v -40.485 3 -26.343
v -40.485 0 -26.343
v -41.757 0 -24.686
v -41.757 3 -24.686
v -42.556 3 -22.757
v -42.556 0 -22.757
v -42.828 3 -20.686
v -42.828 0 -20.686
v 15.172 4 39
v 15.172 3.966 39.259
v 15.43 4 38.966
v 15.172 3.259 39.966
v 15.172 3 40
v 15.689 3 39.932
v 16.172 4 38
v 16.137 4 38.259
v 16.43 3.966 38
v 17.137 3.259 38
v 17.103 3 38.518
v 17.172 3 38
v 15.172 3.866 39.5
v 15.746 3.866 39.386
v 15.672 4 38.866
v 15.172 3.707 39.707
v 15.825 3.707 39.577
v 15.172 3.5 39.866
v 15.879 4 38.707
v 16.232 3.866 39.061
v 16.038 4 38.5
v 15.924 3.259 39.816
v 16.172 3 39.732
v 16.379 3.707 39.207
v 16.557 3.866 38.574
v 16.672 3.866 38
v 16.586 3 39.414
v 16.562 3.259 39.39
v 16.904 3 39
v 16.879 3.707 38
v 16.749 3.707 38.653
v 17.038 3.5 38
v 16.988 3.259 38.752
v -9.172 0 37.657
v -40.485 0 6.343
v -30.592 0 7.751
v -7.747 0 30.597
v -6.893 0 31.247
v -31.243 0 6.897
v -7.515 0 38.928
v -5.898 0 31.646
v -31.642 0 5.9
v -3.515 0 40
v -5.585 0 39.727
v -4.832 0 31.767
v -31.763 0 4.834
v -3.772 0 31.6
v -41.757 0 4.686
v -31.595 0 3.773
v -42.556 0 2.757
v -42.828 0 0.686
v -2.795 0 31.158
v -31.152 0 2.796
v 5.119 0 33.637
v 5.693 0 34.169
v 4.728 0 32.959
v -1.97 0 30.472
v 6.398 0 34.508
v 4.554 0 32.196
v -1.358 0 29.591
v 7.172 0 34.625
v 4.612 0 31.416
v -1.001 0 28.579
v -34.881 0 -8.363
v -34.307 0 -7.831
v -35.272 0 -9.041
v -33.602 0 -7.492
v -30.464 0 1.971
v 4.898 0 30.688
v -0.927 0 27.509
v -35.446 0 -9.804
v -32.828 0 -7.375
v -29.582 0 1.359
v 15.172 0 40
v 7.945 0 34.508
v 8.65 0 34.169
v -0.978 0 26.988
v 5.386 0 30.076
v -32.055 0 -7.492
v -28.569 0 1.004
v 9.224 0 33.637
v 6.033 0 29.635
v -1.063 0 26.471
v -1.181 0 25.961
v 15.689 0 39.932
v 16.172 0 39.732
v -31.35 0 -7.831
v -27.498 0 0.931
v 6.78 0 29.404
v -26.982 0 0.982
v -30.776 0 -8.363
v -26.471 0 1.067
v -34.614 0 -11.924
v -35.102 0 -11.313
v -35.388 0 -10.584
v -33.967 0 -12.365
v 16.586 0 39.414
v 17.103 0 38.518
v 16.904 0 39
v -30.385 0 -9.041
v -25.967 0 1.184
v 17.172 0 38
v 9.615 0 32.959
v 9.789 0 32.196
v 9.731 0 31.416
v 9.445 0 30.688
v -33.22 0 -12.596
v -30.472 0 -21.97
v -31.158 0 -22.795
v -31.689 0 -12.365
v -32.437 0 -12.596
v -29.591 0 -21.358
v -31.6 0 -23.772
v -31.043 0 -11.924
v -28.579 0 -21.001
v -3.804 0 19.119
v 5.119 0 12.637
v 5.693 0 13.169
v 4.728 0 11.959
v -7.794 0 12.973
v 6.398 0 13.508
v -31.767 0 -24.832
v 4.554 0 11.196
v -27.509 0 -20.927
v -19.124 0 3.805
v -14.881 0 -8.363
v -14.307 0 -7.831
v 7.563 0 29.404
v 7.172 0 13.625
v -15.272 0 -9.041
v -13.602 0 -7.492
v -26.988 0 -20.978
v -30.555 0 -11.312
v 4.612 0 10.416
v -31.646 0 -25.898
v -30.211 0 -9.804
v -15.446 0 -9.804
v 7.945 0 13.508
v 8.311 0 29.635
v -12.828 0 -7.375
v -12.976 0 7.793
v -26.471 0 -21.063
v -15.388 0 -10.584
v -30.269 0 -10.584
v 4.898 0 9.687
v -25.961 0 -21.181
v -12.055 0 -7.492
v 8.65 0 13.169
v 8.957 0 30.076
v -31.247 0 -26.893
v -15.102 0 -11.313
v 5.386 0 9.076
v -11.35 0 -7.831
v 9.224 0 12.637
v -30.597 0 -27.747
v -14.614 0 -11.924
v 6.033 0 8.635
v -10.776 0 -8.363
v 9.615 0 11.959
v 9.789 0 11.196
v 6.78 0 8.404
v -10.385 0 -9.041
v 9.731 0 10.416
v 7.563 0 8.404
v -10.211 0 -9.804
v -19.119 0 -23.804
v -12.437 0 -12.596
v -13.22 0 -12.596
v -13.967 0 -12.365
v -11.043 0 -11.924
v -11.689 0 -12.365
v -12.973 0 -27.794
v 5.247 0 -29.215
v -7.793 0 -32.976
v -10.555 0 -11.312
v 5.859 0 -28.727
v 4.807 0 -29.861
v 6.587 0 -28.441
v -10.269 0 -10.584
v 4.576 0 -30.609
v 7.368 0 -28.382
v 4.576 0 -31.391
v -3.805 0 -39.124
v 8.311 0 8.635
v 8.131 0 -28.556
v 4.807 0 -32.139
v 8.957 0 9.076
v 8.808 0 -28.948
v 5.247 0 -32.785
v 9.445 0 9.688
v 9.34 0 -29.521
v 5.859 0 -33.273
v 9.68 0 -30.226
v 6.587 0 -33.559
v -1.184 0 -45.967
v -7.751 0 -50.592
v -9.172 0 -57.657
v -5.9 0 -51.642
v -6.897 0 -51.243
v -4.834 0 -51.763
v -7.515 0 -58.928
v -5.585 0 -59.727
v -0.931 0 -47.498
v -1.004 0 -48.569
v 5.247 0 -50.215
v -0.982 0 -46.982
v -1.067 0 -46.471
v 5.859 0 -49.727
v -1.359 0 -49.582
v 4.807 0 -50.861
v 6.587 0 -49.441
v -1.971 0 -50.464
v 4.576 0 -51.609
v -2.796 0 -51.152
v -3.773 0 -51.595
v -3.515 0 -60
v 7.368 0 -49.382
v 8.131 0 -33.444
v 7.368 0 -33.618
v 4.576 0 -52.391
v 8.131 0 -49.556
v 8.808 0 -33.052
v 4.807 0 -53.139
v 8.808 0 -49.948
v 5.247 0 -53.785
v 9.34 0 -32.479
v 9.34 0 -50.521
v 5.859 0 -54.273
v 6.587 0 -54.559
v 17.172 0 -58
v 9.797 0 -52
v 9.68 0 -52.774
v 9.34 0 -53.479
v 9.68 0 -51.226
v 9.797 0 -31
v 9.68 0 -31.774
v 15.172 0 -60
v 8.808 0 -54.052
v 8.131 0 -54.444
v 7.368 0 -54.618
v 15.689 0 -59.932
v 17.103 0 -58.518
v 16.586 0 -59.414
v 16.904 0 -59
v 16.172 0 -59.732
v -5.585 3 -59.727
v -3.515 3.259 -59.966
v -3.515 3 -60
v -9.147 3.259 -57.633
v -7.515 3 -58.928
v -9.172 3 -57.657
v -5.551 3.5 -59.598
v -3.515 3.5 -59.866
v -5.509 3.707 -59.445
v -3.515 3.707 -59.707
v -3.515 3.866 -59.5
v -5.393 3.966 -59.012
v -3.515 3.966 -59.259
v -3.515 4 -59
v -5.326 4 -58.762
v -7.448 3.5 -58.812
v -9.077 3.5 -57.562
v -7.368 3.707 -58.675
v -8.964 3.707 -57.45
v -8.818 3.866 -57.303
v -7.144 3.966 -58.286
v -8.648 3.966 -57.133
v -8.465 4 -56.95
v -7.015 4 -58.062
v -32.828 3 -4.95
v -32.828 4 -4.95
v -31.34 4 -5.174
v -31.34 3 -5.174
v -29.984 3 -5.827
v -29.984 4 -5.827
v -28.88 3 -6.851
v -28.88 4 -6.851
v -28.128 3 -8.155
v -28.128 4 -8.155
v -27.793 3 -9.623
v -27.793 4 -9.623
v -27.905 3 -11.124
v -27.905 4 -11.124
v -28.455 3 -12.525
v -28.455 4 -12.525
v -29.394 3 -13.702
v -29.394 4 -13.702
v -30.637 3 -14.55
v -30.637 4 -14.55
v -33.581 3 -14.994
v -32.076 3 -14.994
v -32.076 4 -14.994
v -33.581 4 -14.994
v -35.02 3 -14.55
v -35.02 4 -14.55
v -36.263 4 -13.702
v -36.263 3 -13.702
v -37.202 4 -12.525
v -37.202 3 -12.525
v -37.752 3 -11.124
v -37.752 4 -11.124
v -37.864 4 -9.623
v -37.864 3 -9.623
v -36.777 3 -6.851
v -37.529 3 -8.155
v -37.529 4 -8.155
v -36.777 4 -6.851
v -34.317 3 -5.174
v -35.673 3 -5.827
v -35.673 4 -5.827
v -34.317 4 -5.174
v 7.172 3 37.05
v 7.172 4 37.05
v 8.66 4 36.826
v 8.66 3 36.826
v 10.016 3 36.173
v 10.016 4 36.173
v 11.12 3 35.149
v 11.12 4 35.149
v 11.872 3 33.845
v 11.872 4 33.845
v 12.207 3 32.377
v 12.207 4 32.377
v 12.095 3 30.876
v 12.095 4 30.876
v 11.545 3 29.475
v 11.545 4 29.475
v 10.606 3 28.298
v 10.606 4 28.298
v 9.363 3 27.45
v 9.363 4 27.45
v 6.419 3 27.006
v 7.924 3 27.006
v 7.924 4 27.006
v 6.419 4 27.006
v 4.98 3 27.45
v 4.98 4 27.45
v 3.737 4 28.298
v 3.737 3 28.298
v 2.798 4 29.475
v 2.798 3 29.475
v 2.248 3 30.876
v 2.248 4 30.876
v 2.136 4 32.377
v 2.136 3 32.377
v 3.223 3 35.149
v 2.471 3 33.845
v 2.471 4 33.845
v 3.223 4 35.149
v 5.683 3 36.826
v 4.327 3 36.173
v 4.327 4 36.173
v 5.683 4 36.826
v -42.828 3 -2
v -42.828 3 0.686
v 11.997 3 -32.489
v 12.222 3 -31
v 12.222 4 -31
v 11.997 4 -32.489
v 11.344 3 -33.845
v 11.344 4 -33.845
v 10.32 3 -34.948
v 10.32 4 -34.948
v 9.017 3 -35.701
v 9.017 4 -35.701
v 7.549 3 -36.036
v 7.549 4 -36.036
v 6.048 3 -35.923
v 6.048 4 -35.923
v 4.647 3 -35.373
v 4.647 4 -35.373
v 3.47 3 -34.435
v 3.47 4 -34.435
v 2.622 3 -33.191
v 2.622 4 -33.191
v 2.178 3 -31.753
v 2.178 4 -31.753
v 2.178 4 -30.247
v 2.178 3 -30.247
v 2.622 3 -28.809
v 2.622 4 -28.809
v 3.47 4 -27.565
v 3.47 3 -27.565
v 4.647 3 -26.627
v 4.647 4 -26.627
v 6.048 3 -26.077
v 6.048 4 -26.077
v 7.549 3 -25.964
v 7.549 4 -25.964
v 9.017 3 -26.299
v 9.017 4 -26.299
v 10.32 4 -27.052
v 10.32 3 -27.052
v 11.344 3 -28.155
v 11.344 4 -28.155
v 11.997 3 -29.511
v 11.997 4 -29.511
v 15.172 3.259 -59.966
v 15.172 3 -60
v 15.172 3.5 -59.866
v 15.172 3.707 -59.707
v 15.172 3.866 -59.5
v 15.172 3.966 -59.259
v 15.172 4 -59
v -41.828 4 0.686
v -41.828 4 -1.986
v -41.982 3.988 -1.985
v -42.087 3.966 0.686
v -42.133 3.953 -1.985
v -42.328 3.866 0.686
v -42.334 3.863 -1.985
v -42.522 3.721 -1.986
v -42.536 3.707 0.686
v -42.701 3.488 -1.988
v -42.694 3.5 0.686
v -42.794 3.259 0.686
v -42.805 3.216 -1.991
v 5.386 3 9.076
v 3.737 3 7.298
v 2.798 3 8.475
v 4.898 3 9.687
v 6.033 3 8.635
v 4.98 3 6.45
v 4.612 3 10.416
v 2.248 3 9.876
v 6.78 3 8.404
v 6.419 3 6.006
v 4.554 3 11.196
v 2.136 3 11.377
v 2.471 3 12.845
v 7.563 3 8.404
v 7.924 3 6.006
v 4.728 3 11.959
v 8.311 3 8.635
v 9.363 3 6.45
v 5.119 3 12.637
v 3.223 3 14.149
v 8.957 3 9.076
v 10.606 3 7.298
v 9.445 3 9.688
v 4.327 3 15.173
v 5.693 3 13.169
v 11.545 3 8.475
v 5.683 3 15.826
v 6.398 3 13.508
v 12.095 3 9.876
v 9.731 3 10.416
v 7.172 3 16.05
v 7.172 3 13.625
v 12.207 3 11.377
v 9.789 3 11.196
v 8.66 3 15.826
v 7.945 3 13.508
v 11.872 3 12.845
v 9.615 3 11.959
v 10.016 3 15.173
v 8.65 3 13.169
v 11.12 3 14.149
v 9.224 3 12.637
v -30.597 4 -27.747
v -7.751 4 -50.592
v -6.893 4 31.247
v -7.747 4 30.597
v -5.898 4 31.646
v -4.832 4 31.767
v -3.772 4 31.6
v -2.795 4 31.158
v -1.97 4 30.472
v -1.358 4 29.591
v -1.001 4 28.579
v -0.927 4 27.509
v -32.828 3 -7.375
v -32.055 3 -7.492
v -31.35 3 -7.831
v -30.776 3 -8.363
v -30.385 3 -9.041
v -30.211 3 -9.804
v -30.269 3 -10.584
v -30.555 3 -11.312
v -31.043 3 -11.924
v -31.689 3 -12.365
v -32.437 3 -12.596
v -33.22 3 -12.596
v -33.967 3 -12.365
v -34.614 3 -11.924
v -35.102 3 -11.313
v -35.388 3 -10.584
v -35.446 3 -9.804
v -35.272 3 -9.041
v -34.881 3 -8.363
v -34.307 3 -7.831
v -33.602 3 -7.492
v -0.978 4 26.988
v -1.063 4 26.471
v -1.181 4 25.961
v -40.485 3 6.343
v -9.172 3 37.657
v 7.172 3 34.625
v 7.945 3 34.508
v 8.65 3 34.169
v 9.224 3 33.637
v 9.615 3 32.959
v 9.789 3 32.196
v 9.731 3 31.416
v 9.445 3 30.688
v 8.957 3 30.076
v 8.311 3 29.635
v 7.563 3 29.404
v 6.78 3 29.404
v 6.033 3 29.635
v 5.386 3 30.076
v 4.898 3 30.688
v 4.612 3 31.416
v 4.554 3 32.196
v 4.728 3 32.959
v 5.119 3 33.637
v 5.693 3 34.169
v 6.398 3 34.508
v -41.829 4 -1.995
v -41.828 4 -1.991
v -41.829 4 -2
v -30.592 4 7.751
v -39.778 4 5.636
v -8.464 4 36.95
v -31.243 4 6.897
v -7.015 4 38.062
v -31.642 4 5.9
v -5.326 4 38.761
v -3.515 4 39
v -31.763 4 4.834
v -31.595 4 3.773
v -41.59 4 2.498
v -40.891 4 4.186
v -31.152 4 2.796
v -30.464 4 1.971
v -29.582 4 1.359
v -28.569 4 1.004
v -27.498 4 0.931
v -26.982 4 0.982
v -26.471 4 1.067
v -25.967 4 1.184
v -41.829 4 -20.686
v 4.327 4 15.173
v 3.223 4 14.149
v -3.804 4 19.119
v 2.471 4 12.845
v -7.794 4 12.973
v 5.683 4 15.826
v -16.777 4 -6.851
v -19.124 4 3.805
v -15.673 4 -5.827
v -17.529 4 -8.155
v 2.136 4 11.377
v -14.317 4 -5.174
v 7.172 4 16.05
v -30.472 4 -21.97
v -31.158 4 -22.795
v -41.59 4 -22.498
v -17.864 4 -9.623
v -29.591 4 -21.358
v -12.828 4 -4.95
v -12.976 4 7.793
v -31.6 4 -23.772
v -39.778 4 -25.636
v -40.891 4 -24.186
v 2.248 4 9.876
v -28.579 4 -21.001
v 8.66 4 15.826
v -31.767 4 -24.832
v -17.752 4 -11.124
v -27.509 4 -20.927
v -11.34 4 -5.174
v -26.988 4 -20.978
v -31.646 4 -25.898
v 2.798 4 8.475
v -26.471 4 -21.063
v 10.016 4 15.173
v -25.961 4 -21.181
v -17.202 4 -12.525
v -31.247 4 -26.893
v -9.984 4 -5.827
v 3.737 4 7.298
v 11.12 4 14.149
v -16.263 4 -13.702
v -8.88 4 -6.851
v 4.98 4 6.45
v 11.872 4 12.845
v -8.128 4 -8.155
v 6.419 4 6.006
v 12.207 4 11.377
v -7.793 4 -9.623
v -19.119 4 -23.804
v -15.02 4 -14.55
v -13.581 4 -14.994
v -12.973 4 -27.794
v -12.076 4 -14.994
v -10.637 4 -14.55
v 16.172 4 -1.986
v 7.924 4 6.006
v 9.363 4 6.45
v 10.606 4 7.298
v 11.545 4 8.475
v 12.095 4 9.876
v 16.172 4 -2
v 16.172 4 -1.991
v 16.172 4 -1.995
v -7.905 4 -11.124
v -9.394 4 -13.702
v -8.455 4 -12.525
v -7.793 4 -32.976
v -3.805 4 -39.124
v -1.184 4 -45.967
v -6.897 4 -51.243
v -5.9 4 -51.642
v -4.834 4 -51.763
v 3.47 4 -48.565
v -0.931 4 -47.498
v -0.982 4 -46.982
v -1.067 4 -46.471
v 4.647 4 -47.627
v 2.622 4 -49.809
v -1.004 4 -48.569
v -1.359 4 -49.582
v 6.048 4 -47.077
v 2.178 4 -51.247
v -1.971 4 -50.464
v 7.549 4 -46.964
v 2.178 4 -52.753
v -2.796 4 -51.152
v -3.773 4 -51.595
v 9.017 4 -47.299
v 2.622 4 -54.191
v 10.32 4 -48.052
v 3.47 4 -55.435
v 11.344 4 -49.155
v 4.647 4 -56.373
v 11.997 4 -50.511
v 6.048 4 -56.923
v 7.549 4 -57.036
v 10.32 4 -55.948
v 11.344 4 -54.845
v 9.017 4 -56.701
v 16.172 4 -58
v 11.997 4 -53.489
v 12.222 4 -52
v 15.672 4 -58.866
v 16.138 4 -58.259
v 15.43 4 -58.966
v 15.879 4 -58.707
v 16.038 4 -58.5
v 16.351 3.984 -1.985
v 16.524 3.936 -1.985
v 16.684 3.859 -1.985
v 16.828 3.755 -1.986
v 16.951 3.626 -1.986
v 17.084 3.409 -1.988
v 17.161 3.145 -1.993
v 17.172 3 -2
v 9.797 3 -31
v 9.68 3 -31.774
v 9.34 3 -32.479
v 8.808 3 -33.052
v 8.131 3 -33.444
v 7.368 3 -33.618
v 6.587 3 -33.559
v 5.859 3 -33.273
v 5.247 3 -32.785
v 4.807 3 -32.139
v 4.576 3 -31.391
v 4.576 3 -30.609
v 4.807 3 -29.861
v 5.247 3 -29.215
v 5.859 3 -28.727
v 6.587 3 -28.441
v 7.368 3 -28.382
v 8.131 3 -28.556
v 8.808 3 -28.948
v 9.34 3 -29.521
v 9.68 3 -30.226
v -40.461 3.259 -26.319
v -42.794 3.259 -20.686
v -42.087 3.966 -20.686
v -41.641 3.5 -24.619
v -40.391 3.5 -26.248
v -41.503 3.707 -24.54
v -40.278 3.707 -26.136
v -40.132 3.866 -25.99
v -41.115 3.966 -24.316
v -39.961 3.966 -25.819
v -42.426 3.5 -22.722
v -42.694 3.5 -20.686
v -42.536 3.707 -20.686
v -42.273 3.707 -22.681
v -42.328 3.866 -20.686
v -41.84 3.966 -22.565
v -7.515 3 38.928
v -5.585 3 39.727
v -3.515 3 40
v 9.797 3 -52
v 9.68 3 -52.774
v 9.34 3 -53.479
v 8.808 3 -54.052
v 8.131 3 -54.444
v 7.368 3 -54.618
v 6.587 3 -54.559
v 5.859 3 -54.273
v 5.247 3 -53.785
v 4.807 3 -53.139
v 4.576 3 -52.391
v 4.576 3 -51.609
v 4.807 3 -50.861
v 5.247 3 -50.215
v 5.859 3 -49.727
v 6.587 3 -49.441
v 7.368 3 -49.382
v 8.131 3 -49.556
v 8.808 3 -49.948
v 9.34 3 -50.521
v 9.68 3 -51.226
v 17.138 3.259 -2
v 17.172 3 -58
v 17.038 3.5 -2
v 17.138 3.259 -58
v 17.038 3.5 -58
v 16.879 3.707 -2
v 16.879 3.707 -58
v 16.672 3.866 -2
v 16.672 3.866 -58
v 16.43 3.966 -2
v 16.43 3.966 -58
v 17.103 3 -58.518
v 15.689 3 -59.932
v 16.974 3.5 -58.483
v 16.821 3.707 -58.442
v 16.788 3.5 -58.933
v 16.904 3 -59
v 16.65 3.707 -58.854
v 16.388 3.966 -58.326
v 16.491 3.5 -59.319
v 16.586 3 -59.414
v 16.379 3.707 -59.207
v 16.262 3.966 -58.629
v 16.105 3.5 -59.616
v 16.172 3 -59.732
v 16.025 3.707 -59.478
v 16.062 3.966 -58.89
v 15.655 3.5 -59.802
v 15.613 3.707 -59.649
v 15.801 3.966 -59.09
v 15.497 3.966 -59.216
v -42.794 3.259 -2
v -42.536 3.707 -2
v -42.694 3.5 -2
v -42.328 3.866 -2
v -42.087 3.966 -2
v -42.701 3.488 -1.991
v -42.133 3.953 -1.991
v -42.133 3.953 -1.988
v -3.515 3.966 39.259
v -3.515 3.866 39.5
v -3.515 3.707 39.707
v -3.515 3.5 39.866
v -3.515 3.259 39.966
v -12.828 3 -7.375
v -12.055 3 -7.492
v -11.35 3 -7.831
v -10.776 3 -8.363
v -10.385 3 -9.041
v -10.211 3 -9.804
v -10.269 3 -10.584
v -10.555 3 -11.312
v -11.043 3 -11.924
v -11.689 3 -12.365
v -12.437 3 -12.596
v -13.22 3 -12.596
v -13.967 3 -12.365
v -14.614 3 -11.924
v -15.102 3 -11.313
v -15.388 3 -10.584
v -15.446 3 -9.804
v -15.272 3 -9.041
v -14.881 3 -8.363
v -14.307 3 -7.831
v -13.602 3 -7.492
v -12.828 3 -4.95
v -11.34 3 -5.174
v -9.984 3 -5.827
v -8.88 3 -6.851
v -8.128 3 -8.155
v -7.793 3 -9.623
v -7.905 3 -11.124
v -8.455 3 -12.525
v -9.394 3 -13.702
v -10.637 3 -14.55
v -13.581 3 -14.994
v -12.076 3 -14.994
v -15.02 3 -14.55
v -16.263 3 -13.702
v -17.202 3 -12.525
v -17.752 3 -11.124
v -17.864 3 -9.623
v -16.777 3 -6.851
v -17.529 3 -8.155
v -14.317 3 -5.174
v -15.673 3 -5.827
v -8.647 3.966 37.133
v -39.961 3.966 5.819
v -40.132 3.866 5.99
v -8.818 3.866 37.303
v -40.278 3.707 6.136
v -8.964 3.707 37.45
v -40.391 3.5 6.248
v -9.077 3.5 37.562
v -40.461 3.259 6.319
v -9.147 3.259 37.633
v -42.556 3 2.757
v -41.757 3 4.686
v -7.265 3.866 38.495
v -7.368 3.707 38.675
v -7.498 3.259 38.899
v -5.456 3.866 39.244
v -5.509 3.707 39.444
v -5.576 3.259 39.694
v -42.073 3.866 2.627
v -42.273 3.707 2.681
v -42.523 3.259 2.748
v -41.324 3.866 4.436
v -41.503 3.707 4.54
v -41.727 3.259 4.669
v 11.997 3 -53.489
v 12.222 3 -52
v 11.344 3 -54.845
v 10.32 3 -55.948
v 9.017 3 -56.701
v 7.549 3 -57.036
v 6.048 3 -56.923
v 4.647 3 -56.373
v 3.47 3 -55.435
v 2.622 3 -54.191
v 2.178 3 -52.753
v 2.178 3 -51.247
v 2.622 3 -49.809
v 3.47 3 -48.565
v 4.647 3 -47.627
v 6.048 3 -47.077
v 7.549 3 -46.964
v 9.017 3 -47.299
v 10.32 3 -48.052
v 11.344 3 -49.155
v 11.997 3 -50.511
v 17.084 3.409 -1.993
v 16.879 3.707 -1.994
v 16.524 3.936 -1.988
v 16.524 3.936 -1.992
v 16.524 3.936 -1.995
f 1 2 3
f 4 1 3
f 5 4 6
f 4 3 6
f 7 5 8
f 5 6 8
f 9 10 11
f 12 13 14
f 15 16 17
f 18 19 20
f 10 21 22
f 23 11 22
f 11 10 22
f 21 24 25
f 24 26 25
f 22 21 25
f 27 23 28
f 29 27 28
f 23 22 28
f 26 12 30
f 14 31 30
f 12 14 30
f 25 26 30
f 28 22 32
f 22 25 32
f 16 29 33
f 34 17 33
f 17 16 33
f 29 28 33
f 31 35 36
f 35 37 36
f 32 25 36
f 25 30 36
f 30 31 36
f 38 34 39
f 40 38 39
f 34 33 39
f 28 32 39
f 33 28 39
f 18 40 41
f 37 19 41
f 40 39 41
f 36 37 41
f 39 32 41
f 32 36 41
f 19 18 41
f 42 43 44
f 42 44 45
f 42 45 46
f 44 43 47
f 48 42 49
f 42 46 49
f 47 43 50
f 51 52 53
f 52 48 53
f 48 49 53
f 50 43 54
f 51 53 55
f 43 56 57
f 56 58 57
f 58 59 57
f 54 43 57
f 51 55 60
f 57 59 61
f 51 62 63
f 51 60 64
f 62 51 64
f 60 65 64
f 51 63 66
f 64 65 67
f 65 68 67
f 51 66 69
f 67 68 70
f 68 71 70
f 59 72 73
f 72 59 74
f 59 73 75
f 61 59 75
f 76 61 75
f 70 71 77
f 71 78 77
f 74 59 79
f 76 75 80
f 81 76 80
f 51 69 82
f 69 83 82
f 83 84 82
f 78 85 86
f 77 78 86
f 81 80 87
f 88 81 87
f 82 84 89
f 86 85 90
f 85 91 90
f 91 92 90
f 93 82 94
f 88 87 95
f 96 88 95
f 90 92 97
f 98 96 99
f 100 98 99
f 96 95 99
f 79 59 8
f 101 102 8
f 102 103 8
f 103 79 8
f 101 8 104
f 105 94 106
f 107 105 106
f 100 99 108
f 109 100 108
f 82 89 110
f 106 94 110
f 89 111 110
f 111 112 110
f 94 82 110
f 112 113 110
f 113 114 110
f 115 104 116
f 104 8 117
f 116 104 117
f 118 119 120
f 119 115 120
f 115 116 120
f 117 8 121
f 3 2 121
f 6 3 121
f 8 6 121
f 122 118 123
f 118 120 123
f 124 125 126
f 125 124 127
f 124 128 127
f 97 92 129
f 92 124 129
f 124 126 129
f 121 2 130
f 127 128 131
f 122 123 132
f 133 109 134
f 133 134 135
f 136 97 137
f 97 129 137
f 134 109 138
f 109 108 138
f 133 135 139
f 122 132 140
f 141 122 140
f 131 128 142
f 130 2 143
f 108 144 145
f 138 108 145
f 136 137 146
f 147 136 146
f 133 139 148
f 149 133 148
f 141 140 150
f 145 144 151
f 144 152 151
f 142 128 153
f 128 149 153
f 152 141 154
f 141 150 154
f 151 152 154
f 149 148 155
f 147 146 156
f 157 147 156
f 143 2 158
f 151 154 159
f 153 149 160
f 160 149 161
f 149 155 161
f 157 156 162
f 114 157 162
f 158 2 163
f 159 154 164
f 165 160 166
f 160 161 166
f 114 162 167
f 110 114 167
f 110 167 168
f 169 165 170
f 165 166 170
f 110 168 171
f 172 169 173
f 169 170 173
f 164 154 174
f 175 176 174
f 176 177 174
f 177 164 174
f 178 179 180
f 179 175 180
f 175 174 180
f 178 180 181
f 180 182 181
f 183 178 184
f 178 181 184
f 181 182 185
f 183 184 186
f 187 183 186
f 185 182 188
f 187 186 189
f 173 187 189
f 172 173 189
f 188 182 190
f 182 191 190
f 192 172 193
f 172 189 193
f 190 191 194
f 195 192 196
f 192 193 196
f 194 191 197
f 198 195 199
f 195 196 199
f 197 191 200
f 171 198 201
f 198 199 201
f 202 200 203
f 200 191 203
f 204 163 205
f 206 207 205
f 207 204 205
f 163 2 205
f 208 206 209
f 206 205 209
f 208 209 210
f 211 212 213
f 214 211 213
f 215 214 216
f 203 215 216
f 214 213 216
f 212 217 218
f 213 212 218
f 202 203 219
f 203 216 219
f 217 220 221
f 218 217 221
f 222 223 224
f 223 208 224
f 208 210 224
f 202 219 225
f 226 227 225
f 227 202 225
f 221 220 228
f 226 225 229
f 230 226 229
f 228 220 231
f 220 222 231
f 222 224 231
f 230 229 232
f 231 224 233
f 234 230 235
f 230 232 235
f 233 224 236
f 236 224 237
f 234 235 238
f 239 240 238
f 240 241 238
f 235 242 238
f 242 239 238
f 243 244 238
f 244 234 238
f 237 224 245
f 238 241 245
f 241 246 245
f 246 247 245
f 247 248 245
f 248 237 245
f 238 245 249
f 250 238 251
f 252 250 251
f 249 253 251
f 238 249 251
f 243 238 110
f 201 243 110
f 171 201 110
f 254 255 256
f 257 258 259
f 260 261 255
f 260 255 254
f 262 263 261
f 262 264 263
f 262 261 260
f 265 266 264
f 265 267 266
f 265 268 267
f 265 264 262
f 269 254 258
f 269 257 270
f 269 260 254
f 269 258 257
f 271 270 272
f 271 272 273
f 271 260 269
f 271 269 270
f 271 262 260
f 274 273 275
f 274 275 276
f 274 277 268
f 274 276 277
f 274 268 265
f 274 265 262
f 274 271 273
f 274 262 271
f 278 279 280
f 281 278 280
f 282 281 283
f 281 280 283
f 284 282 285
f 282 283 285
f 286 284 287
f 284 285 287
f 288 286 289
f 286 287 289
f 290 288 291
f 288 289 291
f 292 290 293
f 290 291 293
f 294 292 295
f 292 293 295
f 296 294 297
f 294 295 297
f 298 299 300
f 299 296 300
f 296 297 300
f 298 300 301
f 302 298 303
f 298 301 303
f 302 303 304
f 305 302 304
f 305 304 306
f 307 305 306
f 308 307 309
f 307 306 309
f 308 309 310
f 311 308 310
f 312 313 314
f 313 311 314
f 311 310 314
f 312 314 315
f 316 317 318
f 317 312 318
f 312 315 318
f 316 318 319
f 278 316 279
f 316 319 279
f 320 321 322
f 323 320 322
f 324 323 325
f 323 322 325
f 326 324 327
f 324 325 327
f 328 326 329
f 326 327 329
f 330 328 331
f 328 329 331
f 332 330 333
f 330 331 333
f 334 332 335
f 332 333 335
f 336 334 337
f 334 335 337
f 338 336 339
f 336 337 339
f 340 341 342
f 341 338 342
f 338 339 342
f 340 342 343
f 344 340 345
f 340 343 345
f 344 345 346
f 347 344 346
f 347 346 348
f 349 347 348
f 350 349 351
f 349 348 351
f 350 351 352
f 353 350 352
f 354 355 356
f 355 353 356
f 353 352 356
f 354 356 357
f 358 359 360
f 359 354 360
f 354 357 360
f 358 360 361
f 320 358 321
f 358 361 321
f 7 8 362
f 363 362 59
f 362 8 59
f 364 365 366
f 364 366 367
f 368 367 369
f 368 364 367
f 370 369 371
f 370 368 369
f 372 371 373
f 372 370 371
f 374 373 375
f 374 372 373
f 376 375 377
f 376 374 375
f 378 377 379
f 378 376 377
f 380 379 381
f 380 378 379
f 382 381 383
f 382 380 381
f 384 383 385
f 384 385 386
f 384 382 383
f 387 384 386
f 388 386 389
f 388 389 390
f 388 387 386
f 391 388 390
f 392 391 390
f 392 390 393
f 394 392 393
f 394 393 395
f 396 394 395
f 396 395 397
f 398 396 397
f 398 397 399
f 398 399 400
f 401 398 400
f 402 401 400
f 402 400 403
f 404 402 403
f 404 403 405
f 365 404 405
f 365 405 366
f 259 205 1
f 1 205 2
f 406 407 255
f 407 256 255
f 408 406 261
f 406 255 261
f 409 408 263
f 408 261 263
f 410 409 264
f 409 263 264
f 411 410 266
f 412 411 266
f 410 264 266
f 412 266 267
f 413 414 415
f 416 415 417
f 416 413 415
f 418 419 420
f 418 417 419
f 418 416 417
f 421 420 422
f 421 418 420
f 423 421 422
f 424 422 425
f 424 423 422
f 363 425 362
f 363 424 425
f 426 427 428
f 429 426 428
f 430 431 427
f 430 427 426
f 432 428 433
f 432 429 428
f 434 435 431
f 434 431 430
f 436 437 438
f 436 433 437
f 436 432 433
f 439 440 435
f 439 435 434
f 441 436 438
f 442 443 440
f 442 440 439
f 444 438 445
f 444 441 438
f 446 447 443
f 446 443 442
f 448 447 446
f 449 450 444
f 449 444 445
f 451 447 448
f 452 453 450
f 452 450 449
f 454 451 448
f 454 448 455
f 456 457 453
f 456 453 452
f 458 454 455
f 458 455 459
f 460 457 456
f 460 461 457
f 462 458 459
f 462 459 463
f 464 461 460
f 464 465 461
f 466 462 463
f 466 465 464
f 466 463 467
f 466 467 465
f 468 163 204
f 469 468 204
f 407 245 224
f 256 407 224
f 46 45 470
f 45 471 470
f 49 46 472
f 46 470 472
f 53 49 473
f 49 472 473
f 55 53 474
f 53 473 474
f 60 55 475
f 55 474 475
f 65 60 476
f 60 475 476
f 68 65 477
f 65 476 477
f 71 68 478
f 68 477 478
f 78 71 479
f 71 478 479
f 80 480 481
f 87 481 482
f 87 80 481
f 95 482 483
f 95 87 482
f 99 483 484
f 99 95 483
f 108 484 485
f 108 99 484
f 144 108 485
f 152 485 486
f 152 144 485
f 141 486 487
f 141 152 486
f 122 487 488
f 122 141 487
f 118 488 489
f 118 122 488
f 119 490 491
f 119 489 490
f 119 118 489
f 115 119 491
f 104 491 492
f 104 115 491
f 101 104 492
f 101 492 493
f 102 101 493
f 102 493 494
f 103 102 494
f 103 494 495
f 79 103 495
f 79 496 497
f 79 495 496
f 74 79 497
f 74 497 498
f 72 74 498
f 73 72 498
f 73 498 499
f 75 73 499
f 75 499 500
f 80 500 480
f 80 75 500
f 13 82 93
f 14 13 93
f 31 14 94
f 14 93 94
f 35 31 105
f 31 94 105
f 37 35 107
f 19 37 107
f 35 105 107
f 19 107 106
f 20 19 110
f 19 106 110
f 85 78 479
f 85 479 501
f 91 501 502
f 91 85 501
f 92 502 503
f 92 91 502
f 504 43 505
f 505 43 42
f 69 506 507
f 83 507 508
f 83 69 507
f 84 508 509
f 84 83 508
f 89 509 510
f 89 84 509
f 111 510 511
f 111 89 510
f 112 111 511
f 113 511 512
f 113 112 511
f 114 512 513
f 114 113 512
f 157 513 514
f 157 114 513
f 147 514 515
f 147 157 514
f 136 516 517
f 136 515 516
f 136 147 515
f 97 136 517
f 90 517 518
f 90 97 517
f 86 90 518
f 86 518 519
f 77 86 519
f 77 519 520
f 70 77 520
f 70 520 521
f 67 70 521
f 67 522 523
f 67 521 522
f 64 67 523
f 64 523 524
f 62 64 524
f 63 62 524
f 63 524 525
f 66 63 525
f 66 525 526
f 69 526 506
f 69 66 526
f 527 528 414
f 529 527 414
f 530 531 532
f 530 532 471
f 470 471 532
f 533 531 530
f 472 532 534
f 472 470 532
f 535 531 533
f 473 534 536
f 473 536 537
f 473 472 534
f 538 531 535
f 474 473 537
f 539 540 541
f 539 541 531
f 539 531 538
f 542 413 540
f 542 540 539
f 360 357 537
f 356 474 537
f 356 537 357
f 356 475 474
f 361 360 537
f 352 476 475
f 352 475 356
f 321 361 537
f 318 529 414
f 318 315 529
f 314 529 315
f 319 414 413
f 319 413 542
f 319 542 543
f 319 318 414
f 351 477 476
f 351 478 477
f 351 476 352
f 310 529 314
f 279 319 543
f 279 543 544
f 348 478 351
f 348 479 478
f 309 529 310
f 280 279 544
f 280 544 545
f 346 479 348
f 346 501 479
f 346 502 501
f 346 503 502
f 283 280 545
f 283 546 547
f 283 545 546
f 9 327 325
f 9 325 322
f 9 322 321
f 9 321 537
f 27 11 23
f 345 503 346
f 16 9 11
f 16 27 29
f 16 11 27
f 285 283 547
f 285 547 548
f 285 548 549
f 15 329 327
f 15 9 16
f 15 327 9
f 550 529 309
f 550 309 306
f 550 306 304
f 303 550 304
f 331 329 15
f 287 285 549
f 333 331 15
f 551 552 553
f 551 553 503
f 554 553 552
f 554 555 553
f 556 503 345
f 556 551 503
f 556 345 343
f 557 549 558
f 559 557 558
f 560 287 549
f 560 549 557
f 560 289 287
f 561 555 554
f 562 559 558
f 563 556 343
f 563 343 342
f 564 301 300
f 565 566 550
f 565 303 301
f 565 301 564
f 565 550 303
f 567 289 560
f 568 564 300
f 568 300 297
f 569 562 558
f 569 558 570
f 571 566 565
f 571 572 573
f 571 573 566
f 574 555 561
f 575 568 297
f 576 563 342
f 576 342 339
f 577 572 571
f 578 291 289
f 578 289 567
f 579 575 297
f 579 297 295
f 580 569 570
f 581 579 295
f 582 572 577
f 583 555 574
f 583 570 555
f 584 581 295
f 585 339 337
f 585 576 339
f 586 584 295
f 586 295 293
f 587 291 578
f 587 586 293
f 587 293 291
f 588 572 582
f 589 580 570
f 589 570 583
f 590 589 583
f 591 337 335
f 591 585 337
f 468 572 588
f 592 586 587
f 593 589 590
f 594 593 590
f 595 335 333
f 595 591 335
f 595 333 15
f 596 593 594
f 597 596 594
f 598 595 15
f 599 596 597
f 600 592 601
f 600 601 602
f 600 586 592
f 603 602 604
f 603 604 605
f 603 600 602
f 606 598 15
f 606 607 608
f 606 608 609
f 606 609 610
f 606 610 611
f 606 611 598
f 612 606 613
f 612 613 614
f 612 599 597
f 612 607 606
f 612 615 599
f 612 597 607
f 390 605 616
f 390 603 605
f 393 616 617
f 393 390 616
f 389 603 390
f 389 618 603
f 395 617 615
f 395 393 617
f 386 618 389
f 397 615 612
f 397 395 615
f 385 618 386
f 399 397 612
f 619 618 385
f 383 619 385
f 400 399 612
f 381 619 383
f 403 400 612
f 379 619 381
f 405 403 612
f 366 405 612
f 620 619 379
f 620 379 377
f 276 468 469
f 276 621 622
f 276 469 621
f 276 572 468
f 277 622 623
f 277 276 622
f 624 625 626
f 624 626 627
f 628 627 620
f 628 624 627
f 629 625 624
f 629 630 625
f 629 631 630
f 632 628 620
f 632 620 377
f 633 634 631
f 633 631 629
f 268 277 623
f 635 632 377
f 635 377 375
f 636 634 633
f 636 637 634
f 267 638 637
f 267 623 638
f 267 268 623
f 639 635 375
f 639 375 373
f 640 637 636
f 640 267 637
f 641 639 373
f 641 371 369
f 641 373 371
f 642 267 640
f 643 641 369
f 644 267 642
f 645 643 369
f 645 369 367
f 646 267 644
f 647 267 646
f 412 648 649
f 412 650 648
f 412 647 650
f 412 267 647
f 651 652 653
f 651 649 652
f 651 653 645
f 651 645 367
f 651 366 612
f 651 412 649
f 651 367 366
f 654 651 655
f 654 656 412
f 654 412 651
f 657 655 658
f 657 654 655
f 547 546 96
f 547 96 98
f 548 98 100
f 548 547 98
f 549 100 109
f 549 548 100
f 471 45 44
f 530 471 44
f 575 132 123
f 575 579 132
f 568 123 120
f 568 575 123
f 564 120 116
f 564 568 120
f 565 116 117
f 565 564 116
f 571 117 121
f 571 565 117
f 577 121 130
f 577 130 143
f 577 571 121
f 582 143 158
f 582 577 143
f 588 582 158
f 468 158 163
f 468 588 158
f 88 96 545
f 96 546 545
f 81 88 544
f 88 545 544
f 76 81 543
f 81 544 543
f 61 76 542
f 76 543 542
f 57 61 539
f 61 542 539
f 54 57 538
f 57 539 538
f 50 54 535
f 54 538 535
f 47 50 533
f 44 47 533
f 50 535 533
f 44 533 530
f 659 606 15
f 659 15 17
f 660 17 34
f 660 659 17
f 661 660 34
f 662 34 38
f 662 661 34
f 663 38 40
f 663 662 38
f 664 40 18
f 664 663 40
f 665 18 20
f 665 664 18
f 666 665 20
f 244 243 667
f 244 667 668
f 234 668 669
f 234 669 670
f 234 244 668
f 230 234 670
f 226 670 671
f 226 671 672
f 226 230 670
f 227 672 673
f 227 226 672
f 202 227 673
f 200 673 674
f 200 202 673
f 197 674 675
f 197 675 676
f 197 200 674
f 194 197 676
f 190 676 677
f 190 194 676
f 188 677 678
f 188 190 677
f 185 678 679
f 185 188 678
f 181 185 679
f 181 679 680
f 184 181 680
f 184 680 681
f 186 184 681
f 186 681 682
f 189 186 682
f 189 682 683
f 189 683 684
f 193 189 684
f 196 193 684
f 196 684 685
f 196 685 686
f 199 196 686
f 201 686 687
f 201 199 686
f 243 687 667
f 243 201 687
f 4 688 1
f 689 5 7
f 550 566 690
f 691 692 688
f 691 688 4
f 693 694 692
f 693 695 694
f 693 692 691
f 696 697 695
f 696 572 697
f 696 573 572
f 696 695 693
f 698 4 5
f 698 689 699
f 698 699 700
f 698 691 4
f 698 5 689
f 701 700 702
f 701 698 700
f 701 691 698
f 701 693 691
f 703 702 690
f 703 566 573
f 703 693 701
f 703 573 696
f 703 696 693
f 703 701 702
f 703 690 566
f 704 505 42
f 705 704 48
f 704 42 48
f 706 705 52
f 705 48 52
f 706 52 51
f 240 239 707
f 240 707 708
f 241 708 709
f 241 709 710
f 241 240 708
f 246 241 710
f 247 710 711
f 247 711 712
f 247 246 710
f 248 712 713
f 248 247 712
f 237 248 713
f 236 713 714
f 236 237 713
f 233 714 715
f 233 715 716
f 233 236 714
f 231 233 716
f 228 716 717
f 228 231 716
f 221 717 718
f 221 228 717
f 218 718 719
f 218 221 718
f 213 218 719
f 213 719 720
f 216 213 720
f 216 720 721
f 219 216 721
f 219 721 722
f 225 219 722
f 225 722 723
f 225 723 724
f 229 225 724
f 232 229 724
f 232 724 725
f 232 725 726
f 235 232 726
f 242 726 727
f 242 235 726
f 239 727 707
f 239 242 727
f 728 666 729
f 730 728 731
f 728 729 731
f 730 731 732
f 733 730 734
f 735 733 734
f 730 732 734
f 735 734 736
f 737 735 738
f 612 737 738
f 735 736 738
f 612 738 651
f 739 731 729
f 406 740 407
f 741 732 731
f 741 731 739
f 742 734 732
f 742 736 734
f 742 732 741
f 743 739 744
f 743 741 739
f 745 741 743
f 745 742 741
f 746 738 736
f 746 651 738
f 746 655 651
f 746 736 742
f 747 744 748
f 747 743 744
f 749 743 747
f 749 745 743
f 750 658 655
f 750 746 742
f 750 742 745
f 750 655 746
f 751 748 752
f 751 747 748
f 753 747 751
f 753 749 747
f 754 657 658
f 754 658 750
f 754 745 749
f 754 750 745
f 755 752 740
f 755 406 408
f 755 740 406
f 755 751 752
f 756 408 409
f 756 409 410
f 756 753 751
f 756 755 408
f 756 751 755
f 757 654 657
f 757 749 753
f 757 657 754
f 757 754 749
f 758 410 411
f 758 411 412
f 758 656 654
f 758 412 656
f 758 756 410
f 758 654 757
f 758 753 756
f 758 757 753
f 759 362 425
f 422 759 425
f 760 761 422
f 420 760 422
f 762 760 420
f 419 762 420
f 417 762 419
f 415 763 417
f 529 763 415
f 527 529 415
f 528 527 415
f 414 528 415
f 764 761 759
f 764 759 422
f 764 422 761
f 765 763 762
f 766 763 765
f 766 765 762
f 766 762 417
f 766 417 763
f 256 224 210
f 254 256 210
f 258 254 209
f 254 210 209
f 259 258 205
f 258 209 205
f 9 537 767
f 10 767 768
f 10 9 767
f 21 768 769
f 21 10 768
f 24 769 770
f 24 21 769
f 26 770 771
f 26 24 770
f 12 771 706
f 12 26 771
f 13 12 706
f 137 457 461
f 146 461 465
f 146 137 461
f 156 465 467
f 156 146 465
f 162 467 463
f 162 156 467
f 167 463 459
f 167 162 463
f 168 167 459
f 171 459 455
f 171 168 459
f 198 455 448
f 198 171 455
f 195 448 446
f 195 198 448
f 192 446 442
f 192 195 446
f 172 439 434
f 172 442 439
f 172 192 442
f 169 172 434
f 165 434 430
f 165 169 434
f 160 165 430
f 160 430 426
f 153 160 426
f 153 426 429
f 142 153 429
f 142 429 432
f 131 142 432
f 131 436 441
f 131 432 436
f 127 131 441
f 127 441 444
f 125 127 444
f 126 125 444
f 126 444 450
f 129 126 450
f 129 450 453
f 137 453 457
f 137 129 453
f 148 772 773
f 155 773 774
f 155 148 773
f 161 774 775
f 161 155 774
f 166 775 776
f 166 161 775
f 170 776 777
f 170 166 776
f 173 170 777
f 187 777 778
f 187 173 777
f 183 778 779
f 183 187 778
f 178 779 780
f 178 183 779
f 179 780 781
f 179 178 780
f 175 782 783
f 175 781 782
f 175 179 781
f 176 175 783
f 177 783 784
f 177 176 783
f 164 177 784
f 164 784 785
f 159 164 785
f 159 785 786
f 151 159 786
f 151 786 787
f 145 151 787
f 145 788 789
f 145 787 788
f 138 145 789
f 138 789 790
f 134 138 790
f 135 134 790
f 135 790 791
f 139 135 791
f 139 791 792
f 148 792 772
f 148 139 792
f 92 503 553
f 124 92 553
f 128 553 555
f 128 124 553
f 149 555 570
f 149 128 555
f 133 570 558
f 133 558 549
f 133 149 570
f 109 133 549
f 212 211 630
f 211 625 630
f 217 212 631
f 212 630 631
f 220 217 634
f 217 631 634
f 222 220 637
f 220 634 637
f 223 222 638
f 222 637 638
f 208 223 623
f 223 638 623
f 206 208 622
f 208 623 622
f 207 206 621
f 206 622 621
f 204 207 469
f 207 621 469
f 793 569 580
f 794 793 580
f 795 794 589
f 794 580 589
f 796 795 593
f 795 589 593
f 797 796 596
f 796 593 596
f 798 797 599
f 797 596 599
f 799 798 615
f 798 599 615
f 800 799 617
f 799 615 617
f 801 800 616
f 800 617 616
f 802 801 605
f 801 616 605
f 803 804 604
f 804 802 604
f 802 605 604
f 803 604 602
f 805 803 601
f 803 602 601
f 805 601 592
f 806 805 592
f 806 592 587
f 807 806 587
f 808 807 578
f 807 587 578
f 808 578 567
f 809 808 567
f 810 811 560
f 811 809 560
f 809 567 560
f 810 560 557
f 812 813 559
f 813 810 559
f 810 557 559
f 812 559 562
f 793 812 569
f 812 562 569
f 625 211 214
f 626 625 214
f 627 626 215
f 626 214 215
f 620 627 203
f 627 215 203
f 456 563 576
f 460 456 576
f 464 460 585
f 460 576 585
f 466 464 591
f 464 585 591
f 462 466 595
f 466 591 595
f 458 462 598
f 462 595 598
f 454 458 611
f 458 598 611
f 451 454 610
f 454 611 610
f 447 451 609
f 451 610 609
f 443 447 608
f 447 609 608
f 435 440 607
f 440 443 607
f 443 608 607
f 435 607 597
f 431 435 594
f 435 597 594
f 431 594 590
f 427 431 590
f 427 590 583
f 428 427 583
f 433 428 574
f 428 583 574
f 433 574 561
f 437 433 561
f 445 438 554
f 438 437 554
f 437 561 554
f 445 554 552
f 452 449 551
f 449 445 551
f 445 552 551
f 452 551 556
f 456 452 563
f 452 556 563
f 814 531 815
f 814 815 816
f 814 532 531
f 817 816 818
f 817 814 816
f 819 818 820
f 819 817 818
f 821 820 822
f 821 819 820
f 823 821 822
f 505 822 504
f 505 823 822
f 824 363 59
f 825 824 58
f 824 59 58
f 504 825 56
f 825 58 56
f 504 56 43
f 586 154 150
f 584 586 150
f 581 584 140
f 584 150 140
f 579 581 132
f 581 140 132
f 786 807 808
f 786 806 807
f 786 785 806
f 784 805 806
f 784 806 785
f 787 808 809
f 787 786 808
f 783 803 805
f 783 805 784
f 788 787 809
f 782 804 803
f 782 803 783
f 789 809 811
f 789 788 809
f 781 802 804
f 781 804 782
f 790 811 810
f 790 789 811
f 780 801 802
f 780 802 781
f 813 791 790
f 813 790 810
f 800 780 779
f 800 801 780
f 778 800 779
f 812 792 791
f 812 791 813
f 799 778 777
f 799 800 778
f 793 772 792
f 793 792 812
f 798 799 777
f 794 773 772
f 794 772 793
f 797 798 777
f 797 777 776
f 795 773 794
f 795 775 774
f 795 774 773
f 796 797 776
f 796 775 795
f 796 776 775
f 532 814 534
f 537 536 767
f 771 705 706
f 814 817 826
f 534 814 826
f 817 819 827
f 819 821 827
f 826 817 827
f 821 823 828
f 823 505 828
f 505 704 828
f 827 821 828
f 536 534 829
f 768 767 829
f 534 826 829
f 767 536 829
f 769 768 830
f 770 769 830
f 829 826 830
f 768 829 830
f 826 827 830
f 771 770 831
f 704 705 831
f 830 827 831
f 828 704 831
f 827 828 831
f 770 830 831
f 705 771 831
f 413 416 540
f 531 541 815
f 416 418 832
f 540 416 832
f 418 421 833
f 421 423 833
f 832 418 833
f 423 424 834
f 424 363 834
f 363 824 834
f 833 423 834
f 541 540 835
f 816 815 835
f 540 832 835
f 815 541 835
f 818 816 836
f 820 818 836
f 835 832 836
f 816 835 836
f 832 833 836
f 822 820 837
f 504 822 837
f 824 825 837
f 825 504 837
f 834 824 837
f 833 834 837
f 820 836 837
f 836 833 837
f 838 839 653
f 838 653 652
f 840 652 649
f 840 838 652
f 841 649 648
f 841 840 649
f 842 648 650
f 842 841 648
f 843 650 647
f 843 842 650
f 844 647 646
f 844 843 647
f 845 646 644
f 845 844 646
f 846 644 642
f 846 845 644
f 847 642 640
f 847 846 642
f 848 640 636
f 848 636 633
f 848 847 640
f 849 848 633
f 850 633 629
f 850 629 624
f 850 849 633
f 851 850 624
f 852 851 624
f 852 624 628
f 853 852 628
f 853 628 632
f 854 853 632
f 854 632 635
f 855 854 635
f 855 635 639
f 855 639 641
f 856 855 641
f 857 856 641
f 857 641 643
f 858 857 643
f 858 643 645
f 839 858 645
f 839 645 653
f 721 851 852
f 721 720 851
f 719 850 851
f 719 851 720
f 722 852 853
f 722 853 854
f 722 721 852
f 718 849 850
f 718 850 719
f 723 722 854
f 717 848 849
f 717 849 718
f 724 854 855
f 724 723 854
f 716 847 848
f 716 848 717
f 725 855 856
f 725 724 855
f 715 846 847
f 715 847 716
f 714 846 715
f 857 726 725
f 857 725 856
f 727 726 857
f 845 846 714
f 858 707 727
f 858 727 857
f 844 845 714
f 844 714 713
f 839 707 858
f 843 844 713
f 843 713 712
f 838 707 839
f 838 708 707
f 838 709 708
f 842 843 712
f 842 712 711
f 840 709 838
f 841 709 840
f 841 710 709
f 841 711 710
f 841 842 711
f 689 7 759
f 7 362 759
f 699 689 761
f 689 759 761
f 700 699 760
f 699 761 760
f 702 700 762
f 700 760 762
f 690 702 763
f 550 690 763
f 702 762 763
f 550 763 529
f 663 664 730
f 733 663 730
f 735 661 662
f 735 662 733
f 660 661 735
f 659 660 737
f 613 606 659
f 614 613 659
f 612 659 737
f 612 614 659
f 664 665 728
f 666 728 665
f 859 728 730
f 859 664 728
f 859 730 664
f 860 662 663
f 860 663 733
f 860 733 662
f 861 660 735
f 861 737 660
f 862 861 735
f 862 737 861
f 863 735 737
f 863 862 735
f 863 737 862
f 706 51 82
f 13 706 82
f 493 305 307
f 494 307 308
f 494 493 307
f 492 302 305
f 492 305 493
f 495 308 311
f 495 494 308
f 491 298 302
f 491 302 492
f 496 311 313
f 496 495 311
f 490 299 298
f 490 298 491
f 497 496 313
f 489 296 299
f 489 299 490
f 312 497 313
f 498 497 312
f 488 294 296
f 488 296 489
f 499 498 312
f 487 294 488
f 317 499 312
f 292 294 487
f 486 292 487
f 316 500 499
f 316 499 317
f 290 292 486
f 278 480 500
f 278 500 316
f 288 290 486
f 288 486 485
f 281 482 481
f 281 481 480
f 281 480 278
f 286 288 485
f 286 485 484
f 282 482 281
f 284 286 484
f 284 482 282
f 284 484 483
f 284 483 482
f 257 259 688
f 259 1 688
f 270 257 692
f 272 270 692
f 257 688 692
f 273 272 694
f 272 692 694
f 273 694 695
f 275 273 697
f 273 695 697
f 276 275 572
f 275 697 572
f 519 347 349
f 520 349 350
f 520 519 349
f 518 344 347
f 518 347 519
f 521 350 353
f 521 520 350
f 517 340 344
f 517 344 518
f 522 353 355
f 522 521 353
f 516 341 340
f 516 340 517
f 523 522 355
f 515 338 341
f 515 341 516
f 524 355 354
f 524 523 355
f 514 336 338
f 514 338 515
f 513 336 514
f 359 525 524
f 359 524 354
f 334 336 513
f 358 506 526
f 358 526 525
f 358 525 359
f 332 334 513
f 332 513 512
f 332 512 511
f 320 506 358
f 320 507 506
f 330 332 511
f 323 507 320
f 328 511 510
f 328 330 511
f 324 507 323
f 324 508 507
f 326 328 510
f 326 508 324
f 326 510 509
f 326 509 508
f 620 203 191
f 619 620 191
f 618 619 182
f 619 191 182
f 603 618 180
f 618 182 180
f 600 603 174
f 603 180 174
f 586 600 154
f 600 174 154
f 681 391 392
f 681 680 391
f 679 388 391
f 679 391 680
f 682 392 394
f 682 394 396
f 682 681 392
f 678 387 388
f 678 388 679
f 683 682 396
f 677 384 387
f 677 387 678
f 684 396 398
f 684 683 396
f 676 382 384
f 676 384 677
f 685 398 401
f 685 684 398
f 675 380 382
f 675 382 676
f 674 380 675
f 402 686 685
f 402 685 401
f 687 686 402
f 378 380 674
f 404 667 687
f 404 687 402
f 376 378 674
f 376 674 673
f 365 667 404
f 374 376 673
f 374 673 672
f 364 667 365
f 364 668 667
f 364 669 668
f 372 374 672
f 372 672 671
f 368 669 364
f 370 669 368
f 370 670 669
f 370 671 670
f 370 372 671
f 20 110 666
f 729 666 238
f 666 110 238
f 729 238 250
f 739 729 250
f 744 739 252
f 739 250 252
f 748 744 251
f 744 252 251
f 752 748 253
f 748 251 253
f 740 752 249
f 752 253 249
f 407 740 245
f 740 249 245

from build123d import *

# Parameters (mm, degrees)
SKETCH1_R             = 2.625
BOSS_EXTRUDE1_DEPTH   = 4
FILLET1_R             = 35
FILLET2_R             = 8
SKETCH2_R             = 5.05
CUT_EXTRUDE1_DEPTH    = 1
FILLET3_R             = 1
FILLET7_R             = 4
MIRROR1_OUTLINE_R     = 5.05
MIRROR1_DEPTH         = 4
MIRROR1_2_OUTLINE_R   = 5.05
MIRROR1_2_OUTLINE_R_2 = 2.625
MIRROR1_2_DEPTH       = 3
FILLET6_R             = 1
SKETCH3_R             = 6
BOSS_EXTRUDE2_DEPTH   = 4
FILLET8_R             = 4


with BuildPart() as part:
    # Sketch1 → Boss-Extrude1 (new body)
    with BuildSketch(Plane(origin=(0, 0, 0), x_dir=(1, 0, 0), z_dir=(0, 1, 0))):
        with BuildLine():
            Line((-0.828427125, -40), (15.171572875, -40))
            ThreePointArc((15.171572875, -40), (16.585786438, -39.414213562), (17.171572875, -38))
            Line((17.171572875, -38), (17.171572875, -10.175438596))
            Line((17.171572875, -10.175438596), (17.171572875, 18))
            ThreePointArc((17.171572875, 18), (16.585786438, 19.414213562), (15.171572875, 20))
            Line((15.171572875, 20), (-40.828427125, 20))
            ThreePointArc((-40.828427125, 20), (-42.242640687, 19.414213562), (-42.828427125, 18))
            Line((-42.828427125, 18), (-42.828427125, 2))
            Line((-42.828427125, 2), (-42.828427125, -4))
            Line((-42.828427125, -4), (-6.828427125, -40))
            Line((-6.828427125, -40), (-0.828427125, -40))
        make_face()
        with Locations(Location((-32.828427125, 10, 0), (0, 0, 270))):
            Circle(SKETCH1_R, mode=Mode.SUBTRACT)
        with Locations(Location((-12.828427125, 10, 0), (0, 0, 270))):
            Circle(SKETCH1_R, mode=Mode.SUBTRACT)
        with Locations(Location((7.171572875, -32, 0), (0, 0, 270))):
            Circle(SKETCH1_R, mode=Mode.SUBTRACT)
        with Locations(Location((7.171572875, 10, 0), (0, 0, 270))):
            Circle(SKETCH1_R, mode=Mode.SUBTRACT)
        with Locations(Location((7.171572875, -11, 0), (0, 0, 270))):
            Circle(SKETCH1_R, mode=Mode.SUBTRACT)
        Polygon((0, 0), (0, -34.343145751), (-4, -34.343145751), (-34.343145751, -4), (-34.343145751, 0), align=None, mode=Mode.SUBTRACT)
    extrude(amount=BOSS_EXTRUDE1_DEPTH)

    # Fillet1
    # the kernel refuses this fillet: 35 mm, written as the material it adds along each edge
    with BuildSketch(Plane(origin=(0, 0, 0), x_dir=(-1, 0, 0), z_dir=(0, 1, 0))) as fillet1_piece_1:
        with BuildLine():
            CenterArc((34.993835779, 35), FILLET1_R, 181.075348167, 88.924651833)
            Line((0, 34.343145751), (-0.699876716, 34.330008666))
            ThreePointArc((-0.699876716, 34.330008666), (-0.7, 17.171572875), (-0.7, 0))
            Line((-0.7, 0), (0, -0.7))
            Line((0, -0.7), (34.993835779, -0.7))
            Line((34.993835779, -0.7), (34.993835779, 0))
        make_face()
    extrude(amount=4)

    # Fillet2
    # the kernel refuses this fillet: 8 mm, written as the material it adds along each edge
    with BuildSketch(Plane(origin=(0, 0, 34.343145751), x_dir=(-0.13953759415061998, 0, -0.9902167741553647), z_dir=(0, 1, 0))) as fillet2_piece_1:
        with BuildLine():
            CenterArc((7.497620247, 7.941288924), FILLET2_R, 209.838221464, 67.107520075)
            Line((0.558150377, 3.960867097), (0, 0))
            ThreePointArc((0, 0), (4.232527559, -0.256860958), (8.465055117, 0))
        make_face()
    extrude(amount=4)
    with BuildSketch(Plane(origin=(-34.343145751, 4, 0.006049059), x_dir=(0.9902532983948017, 0, 0.13927815700322774), z_dir=(0, -1, 0))) as fillet2_piece_2:
        with BuildLine():
            CenterArc((7.49233694, 7.941371943), FILLET2_R, 209.887169965, 67.053653065)
            Line((0.556270126, 3.955023093), (0, 0))
            ThreePointArc((0, 0), (4.229545047, -0.256497749), (8.459090094, 0))
        make_face()
    extrude(amount=4)
    # the kernel refuses this fillet: 8 mm, written as the material it takes off along each edge
    with BuildSketch(Plane(origin=(-42.828427125, -8.284271247, 4), x_dir=(0.7071067811865472, 0, 0.7071067811865477), z_dir=(0, 1, 0)), Plane(origin=(-6.828427125, -8.284271247, 40), x_dir=(1, 0, 0), z_dir=(0, 1, 0))) as fillet2_2_piece_1:
        with BuildLine():
            CenterArc((FILLET2_R * 0.414213562373, FILLET2_R), FILLET2_R, 225, 45)
            Line((-FILLET2_R * 0.292893218813, FILLET2_R * 0.292893218813), (0, 0))
            Line((0, 0), (FILLET2_R * 0.414213562373, 0))
        make_face()
    extrude(amount=20.568542495, mode=Mode.SUBTRACT)

    # Sketch2 → Cut-Extrude1 (cut)
    with BuildSketch(Plane(origin=(0, 4, 0), x_dir=(1, 0, 0), z_dir=(0, 1, 0))):
        with Locations(Location((-32.828427125, 10, 0), (0, 0, 270))):
            Circle(SKETCH2_R)
        with Locations(Location((-12.828427125, 10, 0), (0, 0, 270))):
            Circle(SKETCH2_R)
        with Locations(Location((7.171572875, 10, 0), (0, 0, 270))):
            Circle(SKETCH2_R)
        with Locations(Location((7.171572875, -11, 0), (0, 0, 270))):
            Circle(SKETCH2_R)
        with Locations(Location((7.171572875, -32, 0), (0, 0, 270))):
            Circle(SKETCH2_R)
    extrude(amount=-CUT_EXTRUDE1_DEPTH, mode=Mode.SUBTRACT)

    # Fillet3
    fillet3_edges = [part.edges().sort_by_distance(p)[0] for p in [
        (-12.828427125, 4, -20),
        (-42.242640687, 4, -19.414213562),
        (-42.828427125, 4, -8.656854249),
        (16.585786438, 4, 39.414213562),
        (17.171572875, 4, 10),
        (-24.828427125, 4, 22),
        (5.828427125, 4, 40),
        (-6.576186085, 4, 39.39103626),
        (-42.219463385, 4, 3.74775896),
        (16.585786438, 4, -19.414213562),
    ]]
    fillet(fillet3_edges, radius=FILLET3_R)

    # Fillet7
    fillet7_edges = [part.edges().sort_by_distance(p)[0] for p in [
        (-34.343145751, 2, 4),
        (-4, 2, 34.343145751),
    ]]
    fillet(fillet7_edges, radius=FILLET7_R)

    # Mirror1: read off the stored shape, not the designer's step
    # Mirror1 outline → Mirror1 (add)
    with BuildSketch(Plane(origin=(0, 0, 0), x_dir=(1, 0, 0), z_dir=(0, 1, 0))):
        with BuildLine():
            ThreePointArc((-3.514718626, 60), (-6.576186085, 59.39103626), (-9.171572875, 57.656854249))
            Line((-9.171572875, 57.656854249), (-40.485281374, 26.343145751))
            ThreePointArc((-40.485281374, 26.343145751), (-42.219463385, 23.74775896), (-42.828427125, 20.686291501))
            Line((-42.828427125, 20.686291501), (-42.828427125, 2))
            ThreePointArc((-42.828427125, 2), (-42.560477932, 1), (-41.828427125, 0.267949192))
            Line((-41.828427125, 0.267949192), (-41.828427125, -0.686291501))
            ThreePointArc((-41.828427125, -0.686291501), (-41.295583852, -3.365075528), (-39.778174593, -5.636038969))
            Line((-39.778174593, -5.636038969), (-8.464466094, -36.949747468))
            ThreePointArc((-8.464466094, -36.949747468), (-6.193502652, -38.467156728), (-3.514718626, -39))
            Line((-3.514718626, -39), (15.171572875, -39))
            ThreePointArc((15.171572875, -39), (15.878679656, -38.707106781), (16.171572875, -38))
            Line((16.171572875, -38), (16.171572875, 0.267949192))
            ThreePointArc((16.171572875, 0.267949192), (16.903623683, 1), (17.171572875, 2))
            Line((17.171572875, 2), (17.171572875, 58))
            ThreePointArc((17.171572875, 58), (16.585786438, 59.414213562), (15.171572875, 60))
            Line((15.171572875, 60), (-3.514718626, 60))
        make_face()
        with BuildLine():
            ThreePointArc((-0.926569244, -27.509231599), (-3.268603973, -31.412129037), (-7.746610443, -30.596535308))
            Line((-7.746610443, -30.596535308), (-30.592327017, -7.750818734))
            ThreePointArc((-30.592327017, -7.750818734), (-31.406448507, -3.269563854), (-27.497905753, -0.931245518))
            ThreePointArc((-27.497905753, -0.931245518), (-26.72605518, -1.020502526), (-25.966503884, -1.184215537))
            ThreePointArc((-25.966503884, -1.184215537), (-10.249403108, -10.246958736), (-1.181193425, -25.960906179))
            ThreePointArc((-1.181193425, -25.960906179), (-1.015828492, -26.728811048), (-0.926569244, -27.509231599))
        make_face(mode=Mode.SUBTRACT)
        with Locations((-32.828427125, 10)):
            Circle(MIRROR1_OUTLINE_R, mode=Mode.SUBTRACT)
        with Locations((7.171572875, -32)):
            Circle(MIRROR1_OUTLINE_R, mode=Mode.SUBTRACT)
        with Locations((-12.828427125, 10)):
            Circle(MIRROR1_OUTLINE_R, mode=Mode.SUBTRACT)
        with Locations((7.171572875, -11)):
            Circle(MIRROR1_OUTLINE_R, mode=Mode.SUBTRACT)
        with Locations((7.171572875, 10)):
            Circle(MIRROR1_OUTLINE_R, mode=Mode.SUBTRACT)
        with BuildLine():
            ThreePointArc((-25.960906179, 21.181193425), (-30.576929417, 21.327068181), (-34.343145751, 24))
            Line((-34.343145751, 24), (-4, 54.343145751))
            ThreePointArc((-4, 54.343145751), (-1.330496844, 50.57891176), (-1.184215537, 45.966503884))
            ThreePointArc((-1.184215537, 45.966503884), (-10.246958736, 30.249403108), (-25.960906179, 21.181193425))
        make_face(mode=Mode.SUBTRACT)
        with Locations((7.171572875, 31)):
            Circle(MIRROR1_OUTLINE_R, mode=Mode.SUBTRACT)
        with Locations((7.171572875, 52)):
            Circle(MIRROR1_OUTLINE_R, mode=Mode.SUBTRACT)
    extrude(amount=MIRROR1_DEPTH)

    # Mirror1 2 outline → Mirror1 2 (add)
    # profile 1 of 2: a face of its own
    with BuildSketch(Plane(origin=(0, 0, 0), x_dir=(1, 0, 0), z_dir=(0, 1, 0))):
        with Locations((7.171572875, 31)):
            Circle(MIRROR1_2_OUTLINE_R)
        with Locations((7.171572875, 31)):
            Circle(MIRROR1_2_OUTLINE_R_2, mode=Mode.SUBTRACT)
    # profile 2 of 2: a face of its own
    with BuildSketch(Plane(origin=(0, 0, 0), x_dir=(1, 0, 0), z_dir=(0, 1, 0))):
        with Locations((7.171572875, 52)):
            Circle(MIRROR1_2_OUTLINE_R)
        with Locations((7.171572875, 52)):
            Circle(MIRROR1_2_OUTLINE_R_2, mode=Mode.SUBTRACT)
    extrude(amount=MIRROR1_2_DEPTH)

    # Fillet6
    fillet6_edges = [part.edges().sort_by_distance(p)[0] for p in [
        (-42.828427125, 4, -11.34314575),
        (-42.219463385, 4, -23.74775896),
        (-24.828427125, 4, -42),
        (-6.576186085, 4, -59.39103626),
        (5.828427125, 4, -60),
        (16.585786438, 4, -59.414213563),
        (17.171572875, 4, -30),
    ]]
    fillet(fillet6_edges, radius=FILLET6_R - 0.0001)  # a hair under: the kernel refuses the full size

    # Sketch3 → Boss-Extrude2 (add)
    with BuildSketch(Plane(origin=(0, 4, 0), x_dir=(1, 0, 0), z_dir=(0, 1, 0))):
        with Locations((7.171572875, 10)):
            Circle(SKETCH3_R)
    extrude(amount=-BOSS_EXTRUDE2_DEPTH)

    # Fillet8
    fillet8_edges = [part.edges().sort_by_distance(p)[0] for p in [
        (-4, 2, -54.343145751),
        (-34.343145751, 2, -24),
    ]]
    fillet(fillet8_edges, radius=FILLET8_R)


solid = part.part
